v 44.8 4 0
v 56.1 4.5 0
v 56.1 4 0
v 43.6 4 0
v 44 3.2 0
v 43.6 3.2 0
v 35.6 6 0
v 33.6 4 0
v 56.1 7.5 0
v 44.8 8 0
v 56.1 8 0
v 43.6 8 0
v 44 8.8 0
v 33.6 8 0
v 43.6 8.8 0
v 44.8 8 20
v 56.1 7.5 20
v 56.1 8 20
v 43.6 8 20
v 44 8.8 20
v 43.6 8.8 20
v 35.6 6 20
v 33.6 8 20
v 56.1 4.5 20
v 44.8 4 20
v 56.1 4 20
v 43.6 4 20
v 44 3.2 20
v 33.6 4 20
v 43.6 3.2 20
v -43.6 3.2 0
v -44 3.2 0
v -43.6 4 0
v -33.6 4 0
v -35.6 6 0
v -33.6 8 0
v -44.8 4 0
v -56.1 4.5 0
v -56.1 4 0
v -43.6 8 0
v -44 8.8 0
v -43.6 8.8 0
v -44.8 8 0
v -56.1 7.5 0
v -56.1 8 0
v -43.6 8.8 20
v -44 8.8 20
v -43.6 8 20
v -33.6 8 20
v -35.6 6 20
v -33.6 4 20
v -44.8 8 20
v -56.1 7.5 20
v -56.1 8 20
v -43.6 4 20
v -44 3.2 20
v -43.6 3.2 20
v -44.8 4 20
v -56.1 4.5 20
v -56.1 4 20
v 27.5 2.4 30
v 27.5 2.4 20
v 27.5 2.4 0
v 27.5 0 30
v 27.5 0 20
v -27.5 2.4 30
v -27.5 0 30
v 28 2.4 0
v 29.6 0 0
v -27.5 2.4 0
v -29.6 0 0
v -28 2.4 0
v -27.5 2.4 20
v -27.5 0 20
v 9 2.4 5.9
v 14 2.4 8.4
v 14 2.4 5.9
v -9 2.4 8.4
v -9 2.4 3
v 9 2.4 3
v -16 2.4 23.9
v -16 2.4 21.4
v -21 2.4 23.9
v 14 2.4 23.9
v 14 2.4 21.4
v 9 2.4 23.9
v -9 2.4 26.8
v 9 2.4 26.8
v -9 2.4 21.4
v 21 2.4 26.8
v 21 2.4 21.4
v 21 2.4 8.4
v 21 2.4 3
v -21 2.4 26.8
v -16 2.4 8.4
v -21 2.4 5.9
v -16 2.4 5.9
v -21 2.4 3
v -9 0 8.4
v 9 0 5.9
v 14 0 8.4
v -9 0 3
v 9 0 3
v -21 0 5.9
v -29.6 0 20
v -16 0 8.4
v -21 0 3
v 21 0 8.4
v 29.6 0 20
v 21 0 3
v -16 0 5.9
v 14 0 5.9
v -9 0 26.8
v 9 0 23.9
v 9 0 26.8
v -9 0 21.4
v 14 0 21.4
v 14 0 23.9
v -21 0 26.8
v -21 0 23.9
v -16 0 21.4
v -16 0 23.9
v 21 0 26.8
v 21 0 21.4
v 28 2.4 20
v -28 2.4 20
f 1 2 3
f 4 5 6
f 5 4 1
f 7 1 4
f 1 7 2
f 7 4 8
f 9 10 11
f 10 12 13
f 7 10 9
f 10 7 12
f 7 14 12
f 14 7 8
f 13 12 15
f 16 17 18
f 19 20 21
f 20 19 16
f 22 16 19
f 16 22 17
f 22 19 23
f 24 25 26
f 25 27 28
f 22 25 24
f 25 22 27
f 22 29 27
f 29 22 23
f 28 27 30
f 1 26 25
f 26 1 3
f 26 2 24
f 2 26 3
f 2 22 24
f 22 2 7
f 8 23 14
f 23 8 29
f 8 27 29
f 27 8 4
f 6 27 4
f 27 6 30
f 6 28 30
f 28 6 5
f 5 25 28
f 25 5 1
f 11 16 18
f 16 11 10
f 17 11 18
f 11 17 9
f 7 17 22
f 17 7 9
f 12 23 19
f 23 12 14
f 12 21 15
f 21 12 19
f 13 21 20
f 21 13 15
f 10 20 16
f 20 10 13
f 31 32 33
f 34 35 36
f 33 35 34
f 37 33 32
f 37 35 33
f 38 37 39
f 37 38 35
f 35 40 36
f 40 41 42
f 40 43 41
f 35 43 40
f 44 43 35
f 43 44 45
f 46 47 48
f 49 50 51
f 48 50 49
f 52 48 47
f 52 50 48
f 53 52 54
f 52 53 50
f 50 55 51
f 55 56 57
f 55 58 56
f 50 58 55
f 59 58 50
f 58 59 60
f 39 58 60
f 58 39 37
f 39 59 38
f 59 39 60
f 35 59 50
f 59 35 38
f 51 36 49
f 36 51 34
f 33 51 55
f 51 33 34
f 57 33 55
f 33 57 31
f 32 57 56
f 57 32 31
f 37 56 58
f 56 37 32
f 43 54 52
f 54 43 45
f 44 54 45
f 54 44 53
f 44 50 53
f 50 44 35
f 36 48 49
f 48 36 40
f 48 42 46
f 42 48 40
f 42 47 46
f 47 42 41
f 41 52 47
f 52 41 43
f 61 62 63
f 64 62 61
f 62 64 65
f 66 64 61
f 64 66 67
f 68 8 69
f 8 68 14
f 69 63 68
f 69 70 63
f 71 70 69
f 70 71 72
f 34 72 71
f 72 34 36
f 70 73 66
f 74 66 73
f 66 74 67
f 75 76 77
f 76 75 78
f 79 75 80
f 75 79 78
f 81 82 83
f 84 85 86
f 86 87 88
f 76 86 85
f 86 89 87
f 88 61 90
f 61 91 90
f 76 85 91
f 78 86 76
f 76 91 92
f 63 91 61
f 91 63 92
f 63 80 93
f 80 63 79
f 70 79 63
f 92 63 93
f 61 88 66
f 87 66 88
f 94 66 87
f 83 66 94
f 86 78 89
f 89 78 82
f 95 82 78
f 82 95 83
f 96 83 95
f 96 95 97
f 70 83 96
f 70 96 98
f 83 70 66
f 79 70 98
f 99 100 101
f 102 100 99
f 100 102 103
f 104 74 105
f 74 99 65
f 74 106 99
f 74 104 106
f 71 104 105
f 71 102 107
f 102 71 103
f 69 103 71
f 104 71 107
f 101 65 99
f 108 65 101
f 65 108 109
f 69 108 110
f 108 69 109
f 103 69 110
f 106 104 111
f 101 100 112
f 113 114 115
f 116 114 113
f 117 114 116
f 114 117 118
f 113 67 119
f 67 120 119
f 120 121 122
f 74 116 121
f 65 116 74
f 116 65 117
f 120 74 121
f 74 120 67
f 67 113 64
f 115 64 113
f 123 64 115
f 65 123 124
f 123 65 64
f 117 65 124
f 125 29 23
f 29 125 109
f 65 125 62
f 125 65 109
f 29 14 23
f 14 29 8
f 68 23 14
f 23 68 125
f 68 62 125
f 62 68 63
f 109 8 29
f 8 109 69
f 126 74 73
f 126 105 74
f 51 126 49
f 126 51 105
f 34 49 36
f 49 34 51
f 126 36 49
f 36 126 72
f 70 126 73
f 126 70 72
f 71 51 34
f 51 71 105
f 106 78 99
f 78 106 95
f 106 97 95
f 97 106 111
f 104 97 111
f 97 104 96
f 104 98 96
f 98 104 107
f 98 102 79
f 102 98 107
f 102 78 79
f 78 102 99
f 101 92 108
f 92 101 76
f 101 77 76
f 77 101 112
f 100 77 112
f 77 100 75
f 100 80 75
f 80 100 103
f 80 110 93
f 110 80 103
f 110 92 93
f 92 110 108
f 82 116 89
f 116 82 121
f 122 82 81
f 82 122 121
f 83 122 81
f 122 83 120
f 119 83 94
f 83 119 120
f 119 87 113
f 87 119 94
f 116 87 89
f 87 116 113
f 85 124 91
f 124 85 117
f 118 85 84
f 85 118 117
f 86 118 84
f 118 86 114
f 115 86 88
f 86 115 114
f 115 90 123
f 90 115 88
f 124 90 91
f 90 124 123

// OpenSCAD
// Generate universal plate or screw connector
connector="universal"; // [universal:Universal connector plate,screw:M6 hole connector]

// Width of device, measured from outside of fixation bracket to outside of second bracket
device_width=100;

/* [Hidden] */
// Development values for testing
//Xperia Active
device_width=87.2;


bar_height=20;
bar_width=4;
latch_space=10;
connector_depth=2.4;

module hook () {
  linear_extrude(height=bar_height)translate([0,-2,0])polygon(points=[[-latch_space,0],[0,0],[0,-0.8],[0.4,-0.8],[1.2,0],[12.5,0],[12.5, 0.5],[-latch_space+2,2],[-latch_space,bar_width/2]]);

}

module latch () {
  hook();
  mirror([0,1,0])hook();
};

module cutout () {
  translate([0,connector_depth,0])rotate([90,0,0])linear_extrude(height=connector_depth*2)polygon(points=[[0,0],[12,0],[12,5.4],[5,5.4],[5,2.9],[0,2.9]]);
}

module beam () {
  beam_length=device_width/2-latch_space;

  linear_extrude(height=bar_height)polygon(points=[[0,0],[beam_length-bar_width,0],[beam_length,bar_width],[beam_length,2*bar_width],[beam_length-(bar_width*2-connector_depth),connector_depth],[0,connector_depth]]);
}

// Universal connector plate. See www.dx.com for hundreds of gooseneck connectors.
module universal_connector () {
 difference() {
  union () {
    translate([-55/2,0,0])cube([55,connector_depth,30]);
    beam();
    mirror()beam();
  }
  translate([-21,0,3])union() {
    union() {
      cutout();
      translate([30,0,0])cutout();
    }
    translate([0,0,23.8])mirror([0,0,1]) {
      cutout();
      translate([30,0,0])cutout();
    }
  }
 }
}

module m6_connector () {
  beam();
  mirror()beam();

  difference() {
    hull() {
      translate([0,-18,0])cylinder(r=6,h=4, $fn=40);
      translate([0, -1.75, 2])cube([19.4, 3.5, 4], center=true);
    }
    translate([0,-18,-1])cylinder(r=3.5,h=6, $fn=40);
  }

  difference () {
    difference () {
      translate([0, -1.75, 2])cube([26.4, 3.5, 4], center=true);
      translate([14.5, -4.8, -1])cylinder(r=5, h=6, $fn=40);
    }
    translate([-14.5, -4.8, -1])cylinder(r=5, h=6, $fn=40);
  }
};

translate([device_width/2,bar_width*1.5,0])latch();
translate([-device_width/2,bar_width*1.5,0])mirror()latch();

if (connector=="universal") {
  universal_connector();
} else {
  m6_connector();
};
